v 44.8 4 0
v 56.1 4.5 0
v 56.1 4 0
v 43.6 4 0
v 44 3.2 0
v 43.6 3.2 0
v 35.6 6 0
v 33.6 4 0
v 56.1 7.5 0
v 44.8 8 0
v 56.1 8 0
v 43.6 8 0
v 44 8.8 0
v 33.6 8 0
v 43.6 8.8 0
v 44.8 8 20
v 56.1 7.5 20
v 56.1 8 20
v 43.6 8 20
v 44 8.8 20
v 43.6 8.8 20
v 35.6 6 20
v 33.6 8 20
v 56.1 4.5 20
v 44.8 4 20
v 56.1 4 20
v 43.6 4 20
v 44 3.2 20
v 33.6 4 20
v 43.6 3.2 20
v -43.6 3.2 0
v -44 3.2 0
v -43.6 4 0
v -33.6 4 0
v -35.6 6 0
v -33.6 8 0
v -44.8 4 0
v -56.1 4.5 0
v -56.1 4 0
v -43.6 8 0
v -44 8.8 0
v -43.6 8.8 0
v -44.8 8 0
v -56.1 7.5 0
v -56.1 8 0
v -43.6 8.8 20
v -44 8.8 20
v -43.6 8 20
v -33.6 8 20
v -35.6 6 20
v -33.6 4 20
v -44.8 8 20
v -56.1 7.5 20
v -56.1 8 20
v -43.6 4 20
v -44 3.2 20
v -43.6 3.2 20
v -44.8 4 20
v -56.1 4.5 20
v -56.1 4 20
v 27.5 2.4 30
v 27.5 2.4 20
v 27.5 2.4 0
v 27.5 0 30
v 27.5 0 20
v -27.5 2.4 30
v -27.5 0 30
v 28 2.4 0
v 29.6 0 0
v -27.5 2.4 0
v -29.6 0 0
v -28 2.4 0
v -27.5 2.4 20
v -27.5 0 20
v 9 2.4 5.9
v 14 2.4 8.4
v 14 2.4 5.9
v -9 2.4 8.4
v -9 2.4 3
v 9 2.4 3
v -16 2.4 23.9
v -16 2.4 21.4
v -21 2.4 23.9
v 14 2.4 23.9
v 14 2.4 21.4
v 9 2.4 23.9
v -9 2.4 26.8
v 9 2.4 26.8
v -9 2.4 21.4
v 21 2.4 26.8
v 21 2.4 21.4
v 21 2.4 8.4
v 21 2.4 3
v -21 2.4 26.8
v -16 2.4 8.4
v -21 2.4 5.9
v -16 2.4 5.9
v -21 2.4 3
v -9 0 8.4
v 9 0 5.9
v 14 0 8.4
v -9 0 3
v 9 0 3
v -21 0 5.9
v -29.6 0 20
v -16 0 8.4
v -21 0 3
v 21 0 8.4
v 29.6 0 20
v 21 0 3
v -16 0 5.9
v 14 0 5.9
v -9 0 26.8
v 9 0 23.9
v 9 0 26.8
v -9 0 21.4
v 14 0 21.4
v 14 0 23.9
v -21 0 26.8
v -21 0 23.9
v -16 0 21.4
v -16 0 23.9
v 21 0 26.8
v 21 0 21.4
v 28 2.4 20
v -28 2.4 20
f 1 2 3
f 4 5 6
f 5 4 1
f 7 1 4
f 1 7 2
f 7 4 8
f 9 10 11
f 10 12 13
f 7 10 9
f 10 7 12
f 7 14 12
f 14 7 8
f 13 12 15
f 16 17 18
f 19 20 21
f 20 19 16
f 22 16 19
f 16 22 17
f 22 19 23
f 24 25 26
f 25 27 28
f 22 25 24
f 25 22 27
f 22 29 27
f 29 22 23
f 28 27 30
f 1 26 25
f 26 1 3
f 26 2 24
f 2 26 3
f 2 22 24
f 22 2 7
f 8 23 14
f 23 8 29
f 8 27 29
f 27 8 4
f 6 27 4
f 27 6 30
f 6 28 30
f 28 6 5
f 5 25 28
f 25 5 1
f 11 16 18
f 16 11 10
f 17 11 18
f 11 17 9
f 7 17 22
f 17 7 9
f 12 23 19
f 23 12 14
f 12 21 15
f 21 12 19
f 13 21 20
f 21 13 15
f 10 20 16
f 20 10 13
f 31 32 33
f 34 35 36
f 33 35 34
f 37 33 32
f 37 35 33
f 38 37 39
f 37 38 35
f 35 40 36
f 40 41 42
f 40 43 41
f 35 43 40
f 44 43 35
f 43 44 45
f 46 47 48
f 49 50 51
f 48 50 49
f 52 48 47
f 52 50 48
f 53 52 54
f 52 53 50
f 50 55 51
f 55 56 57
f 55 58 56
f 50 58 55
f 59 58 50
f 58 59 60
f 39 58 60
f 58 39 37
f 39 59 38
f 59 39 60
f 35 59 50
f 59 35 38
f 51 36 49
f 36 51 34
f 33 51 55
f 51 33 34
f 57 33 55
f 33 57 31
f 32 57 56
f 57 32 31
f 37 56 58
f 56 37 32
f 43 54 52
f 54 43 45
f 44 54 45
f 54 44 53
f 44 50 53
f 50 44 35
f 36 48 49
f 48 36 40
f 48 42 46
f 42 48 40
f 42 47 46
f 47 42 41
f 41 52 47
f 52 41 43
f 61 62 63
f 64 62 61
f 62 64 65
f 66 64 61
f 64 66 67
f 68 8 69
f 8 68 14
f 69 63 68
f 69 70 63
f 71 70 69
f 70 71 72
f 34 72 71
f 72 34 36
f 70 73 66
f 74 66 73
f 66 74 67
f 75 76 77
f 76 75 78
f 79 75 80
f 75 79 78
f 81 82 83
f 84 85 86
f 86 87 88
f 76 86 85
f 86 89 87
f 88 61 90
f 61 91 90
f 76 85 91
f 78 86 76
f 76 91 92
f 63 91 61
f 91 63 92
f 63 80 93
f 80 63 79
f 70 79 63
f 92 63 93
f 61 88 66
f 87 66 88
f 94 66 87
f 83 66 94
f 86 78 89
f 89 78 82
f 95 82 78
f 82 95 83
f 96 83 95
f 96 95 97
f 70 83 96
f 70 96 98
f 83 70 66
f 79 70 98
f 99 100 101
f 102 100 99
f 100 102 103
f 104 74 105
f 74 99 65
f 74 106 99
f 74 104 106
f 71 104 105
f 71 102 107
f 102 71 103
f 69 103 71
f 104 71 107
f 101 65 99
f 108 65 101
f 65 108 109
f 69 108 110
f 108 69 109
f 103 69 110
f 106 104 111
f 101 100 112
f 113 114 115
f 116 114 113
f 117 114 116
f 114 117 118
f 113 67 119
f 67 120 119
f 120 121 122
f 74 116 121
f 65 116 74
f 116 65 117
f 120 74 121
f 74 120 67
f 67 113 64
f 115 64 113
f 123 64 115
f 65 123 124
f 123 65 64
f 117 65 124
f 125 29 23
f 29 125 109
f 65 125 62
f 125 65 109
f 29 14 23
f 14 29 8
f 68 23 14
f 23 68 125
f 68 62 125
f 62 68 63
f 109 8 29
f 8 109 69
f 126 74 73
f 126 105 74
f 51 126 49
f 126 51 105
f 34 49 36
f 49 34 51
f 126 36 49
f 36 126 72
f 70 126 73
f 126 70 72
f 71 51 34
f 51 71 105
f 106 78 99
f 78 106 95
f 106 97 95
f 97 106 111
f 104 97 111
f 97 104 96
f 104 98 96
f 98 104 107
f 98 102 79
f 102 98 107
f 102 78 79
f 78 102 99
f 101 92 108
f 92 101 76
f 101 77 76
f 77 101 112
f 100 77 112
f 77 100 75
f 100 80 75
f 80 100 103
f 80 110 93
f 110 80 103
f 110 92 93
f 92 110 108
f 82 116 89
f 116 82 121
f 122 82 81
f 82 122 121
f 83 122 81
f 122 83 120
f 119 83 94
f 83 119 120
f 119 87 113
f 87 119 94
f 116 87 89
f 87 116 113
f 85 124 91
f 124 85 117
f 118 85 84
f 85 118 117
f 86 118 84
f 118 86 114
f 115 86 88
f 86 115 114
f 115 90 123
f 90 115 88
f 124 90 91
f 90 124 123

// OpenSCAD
// Generate universal plate or screw connector
connector="universal"; // [universal:Universal connector plate,screw:M6 hole connector]

// Width of device, measured from outside of fixation bracket to outside of second bracket
device_width=100;

/* [Hidden] */
// Development values for testing
//Xperia Active
device_width=87.2;


bar_height=20;
bar_width=4;
latch_space=10;
connector_depth=2.4;

module hook () {
  linear_extrude(height=bar_height)translate([0,-2,0])polygon(points=[[-latch_space,0],[0,0],[0,-0.8],[0.4,-0.8],[1.2,0],[12.5,0],[12.5, 0.5],[-latch_space+2,2],[-latch_space,bar_width/2]]);

}

module latch () {
  hook();
  mirror([0,1,0])hook();
};

module cutout () {
  translate([0,connector_depth,0])rotate([90,0,0])linear_extrude(height=connector_depth*2)polygon(points=[[0,0],[12,0],[12,5.4],[5,5.4],[5,2.9],[0,2.9]]);
}

module beam () {
  beam_length=device_width/2-latch_space;

  linear_extrude(height=bar_height)polygon(points=[[0,0],[beam_length-bar_width,0],[beam_length,bar_width],[beam_length,2*bar_width],[beam_length-(bar_width*2-connector_depth),connector_depth],[0,connector_depth]]);
}

// Universal connector plate. See www.dx.com for hundreds of gooseneck connectors.
module universal_connector () {
 difference() {
  union () {
    translate([-55/2,0,0])cube([55,connector_depth,30]);
    beam();
    mirror()beam();
  }
  translate([-21,0,3])union() {
    union() {
      cutout();
      translate([30,0,0])cutout();
    }
    translate([0,0,23.8])mirror([0,0,1]) {
      cutout();
      translate([30,0,0])cutout();
    }
  }
 }
}

module m6_connector () {
  beam();
  mirror()beam();

  difference() {
    hull() {
      translate([0,-18,0])cylinder(r=6,h=4, $fn=40);
      translate([0, -1.75, 2])cube([19.4, 3.5, 4], center=true);
    }
    translate([0,-18,-1])cylinder(r=3.5,h=6, $fn=40);
  }

  difference () {
    difference () {
      translate([0, -1.75, 2])cube([26.4, 3.5, 4], center=true);
      translate([14.5, -4.8, -1])cylinder(r=5, h=6, $fn=40);
    }
    translate([-14.5, -4.8, -1])cylinder(r=5, h=6, $fn=40);
  }
};

translate([device_width/2,bar_width*1.5,0])latch();
translate([-device_width/2,bar_width*1.5,0])mirror()latch();

if (connector=="universal") {
  universal_connector();
} else {
  m6_connector();
};
